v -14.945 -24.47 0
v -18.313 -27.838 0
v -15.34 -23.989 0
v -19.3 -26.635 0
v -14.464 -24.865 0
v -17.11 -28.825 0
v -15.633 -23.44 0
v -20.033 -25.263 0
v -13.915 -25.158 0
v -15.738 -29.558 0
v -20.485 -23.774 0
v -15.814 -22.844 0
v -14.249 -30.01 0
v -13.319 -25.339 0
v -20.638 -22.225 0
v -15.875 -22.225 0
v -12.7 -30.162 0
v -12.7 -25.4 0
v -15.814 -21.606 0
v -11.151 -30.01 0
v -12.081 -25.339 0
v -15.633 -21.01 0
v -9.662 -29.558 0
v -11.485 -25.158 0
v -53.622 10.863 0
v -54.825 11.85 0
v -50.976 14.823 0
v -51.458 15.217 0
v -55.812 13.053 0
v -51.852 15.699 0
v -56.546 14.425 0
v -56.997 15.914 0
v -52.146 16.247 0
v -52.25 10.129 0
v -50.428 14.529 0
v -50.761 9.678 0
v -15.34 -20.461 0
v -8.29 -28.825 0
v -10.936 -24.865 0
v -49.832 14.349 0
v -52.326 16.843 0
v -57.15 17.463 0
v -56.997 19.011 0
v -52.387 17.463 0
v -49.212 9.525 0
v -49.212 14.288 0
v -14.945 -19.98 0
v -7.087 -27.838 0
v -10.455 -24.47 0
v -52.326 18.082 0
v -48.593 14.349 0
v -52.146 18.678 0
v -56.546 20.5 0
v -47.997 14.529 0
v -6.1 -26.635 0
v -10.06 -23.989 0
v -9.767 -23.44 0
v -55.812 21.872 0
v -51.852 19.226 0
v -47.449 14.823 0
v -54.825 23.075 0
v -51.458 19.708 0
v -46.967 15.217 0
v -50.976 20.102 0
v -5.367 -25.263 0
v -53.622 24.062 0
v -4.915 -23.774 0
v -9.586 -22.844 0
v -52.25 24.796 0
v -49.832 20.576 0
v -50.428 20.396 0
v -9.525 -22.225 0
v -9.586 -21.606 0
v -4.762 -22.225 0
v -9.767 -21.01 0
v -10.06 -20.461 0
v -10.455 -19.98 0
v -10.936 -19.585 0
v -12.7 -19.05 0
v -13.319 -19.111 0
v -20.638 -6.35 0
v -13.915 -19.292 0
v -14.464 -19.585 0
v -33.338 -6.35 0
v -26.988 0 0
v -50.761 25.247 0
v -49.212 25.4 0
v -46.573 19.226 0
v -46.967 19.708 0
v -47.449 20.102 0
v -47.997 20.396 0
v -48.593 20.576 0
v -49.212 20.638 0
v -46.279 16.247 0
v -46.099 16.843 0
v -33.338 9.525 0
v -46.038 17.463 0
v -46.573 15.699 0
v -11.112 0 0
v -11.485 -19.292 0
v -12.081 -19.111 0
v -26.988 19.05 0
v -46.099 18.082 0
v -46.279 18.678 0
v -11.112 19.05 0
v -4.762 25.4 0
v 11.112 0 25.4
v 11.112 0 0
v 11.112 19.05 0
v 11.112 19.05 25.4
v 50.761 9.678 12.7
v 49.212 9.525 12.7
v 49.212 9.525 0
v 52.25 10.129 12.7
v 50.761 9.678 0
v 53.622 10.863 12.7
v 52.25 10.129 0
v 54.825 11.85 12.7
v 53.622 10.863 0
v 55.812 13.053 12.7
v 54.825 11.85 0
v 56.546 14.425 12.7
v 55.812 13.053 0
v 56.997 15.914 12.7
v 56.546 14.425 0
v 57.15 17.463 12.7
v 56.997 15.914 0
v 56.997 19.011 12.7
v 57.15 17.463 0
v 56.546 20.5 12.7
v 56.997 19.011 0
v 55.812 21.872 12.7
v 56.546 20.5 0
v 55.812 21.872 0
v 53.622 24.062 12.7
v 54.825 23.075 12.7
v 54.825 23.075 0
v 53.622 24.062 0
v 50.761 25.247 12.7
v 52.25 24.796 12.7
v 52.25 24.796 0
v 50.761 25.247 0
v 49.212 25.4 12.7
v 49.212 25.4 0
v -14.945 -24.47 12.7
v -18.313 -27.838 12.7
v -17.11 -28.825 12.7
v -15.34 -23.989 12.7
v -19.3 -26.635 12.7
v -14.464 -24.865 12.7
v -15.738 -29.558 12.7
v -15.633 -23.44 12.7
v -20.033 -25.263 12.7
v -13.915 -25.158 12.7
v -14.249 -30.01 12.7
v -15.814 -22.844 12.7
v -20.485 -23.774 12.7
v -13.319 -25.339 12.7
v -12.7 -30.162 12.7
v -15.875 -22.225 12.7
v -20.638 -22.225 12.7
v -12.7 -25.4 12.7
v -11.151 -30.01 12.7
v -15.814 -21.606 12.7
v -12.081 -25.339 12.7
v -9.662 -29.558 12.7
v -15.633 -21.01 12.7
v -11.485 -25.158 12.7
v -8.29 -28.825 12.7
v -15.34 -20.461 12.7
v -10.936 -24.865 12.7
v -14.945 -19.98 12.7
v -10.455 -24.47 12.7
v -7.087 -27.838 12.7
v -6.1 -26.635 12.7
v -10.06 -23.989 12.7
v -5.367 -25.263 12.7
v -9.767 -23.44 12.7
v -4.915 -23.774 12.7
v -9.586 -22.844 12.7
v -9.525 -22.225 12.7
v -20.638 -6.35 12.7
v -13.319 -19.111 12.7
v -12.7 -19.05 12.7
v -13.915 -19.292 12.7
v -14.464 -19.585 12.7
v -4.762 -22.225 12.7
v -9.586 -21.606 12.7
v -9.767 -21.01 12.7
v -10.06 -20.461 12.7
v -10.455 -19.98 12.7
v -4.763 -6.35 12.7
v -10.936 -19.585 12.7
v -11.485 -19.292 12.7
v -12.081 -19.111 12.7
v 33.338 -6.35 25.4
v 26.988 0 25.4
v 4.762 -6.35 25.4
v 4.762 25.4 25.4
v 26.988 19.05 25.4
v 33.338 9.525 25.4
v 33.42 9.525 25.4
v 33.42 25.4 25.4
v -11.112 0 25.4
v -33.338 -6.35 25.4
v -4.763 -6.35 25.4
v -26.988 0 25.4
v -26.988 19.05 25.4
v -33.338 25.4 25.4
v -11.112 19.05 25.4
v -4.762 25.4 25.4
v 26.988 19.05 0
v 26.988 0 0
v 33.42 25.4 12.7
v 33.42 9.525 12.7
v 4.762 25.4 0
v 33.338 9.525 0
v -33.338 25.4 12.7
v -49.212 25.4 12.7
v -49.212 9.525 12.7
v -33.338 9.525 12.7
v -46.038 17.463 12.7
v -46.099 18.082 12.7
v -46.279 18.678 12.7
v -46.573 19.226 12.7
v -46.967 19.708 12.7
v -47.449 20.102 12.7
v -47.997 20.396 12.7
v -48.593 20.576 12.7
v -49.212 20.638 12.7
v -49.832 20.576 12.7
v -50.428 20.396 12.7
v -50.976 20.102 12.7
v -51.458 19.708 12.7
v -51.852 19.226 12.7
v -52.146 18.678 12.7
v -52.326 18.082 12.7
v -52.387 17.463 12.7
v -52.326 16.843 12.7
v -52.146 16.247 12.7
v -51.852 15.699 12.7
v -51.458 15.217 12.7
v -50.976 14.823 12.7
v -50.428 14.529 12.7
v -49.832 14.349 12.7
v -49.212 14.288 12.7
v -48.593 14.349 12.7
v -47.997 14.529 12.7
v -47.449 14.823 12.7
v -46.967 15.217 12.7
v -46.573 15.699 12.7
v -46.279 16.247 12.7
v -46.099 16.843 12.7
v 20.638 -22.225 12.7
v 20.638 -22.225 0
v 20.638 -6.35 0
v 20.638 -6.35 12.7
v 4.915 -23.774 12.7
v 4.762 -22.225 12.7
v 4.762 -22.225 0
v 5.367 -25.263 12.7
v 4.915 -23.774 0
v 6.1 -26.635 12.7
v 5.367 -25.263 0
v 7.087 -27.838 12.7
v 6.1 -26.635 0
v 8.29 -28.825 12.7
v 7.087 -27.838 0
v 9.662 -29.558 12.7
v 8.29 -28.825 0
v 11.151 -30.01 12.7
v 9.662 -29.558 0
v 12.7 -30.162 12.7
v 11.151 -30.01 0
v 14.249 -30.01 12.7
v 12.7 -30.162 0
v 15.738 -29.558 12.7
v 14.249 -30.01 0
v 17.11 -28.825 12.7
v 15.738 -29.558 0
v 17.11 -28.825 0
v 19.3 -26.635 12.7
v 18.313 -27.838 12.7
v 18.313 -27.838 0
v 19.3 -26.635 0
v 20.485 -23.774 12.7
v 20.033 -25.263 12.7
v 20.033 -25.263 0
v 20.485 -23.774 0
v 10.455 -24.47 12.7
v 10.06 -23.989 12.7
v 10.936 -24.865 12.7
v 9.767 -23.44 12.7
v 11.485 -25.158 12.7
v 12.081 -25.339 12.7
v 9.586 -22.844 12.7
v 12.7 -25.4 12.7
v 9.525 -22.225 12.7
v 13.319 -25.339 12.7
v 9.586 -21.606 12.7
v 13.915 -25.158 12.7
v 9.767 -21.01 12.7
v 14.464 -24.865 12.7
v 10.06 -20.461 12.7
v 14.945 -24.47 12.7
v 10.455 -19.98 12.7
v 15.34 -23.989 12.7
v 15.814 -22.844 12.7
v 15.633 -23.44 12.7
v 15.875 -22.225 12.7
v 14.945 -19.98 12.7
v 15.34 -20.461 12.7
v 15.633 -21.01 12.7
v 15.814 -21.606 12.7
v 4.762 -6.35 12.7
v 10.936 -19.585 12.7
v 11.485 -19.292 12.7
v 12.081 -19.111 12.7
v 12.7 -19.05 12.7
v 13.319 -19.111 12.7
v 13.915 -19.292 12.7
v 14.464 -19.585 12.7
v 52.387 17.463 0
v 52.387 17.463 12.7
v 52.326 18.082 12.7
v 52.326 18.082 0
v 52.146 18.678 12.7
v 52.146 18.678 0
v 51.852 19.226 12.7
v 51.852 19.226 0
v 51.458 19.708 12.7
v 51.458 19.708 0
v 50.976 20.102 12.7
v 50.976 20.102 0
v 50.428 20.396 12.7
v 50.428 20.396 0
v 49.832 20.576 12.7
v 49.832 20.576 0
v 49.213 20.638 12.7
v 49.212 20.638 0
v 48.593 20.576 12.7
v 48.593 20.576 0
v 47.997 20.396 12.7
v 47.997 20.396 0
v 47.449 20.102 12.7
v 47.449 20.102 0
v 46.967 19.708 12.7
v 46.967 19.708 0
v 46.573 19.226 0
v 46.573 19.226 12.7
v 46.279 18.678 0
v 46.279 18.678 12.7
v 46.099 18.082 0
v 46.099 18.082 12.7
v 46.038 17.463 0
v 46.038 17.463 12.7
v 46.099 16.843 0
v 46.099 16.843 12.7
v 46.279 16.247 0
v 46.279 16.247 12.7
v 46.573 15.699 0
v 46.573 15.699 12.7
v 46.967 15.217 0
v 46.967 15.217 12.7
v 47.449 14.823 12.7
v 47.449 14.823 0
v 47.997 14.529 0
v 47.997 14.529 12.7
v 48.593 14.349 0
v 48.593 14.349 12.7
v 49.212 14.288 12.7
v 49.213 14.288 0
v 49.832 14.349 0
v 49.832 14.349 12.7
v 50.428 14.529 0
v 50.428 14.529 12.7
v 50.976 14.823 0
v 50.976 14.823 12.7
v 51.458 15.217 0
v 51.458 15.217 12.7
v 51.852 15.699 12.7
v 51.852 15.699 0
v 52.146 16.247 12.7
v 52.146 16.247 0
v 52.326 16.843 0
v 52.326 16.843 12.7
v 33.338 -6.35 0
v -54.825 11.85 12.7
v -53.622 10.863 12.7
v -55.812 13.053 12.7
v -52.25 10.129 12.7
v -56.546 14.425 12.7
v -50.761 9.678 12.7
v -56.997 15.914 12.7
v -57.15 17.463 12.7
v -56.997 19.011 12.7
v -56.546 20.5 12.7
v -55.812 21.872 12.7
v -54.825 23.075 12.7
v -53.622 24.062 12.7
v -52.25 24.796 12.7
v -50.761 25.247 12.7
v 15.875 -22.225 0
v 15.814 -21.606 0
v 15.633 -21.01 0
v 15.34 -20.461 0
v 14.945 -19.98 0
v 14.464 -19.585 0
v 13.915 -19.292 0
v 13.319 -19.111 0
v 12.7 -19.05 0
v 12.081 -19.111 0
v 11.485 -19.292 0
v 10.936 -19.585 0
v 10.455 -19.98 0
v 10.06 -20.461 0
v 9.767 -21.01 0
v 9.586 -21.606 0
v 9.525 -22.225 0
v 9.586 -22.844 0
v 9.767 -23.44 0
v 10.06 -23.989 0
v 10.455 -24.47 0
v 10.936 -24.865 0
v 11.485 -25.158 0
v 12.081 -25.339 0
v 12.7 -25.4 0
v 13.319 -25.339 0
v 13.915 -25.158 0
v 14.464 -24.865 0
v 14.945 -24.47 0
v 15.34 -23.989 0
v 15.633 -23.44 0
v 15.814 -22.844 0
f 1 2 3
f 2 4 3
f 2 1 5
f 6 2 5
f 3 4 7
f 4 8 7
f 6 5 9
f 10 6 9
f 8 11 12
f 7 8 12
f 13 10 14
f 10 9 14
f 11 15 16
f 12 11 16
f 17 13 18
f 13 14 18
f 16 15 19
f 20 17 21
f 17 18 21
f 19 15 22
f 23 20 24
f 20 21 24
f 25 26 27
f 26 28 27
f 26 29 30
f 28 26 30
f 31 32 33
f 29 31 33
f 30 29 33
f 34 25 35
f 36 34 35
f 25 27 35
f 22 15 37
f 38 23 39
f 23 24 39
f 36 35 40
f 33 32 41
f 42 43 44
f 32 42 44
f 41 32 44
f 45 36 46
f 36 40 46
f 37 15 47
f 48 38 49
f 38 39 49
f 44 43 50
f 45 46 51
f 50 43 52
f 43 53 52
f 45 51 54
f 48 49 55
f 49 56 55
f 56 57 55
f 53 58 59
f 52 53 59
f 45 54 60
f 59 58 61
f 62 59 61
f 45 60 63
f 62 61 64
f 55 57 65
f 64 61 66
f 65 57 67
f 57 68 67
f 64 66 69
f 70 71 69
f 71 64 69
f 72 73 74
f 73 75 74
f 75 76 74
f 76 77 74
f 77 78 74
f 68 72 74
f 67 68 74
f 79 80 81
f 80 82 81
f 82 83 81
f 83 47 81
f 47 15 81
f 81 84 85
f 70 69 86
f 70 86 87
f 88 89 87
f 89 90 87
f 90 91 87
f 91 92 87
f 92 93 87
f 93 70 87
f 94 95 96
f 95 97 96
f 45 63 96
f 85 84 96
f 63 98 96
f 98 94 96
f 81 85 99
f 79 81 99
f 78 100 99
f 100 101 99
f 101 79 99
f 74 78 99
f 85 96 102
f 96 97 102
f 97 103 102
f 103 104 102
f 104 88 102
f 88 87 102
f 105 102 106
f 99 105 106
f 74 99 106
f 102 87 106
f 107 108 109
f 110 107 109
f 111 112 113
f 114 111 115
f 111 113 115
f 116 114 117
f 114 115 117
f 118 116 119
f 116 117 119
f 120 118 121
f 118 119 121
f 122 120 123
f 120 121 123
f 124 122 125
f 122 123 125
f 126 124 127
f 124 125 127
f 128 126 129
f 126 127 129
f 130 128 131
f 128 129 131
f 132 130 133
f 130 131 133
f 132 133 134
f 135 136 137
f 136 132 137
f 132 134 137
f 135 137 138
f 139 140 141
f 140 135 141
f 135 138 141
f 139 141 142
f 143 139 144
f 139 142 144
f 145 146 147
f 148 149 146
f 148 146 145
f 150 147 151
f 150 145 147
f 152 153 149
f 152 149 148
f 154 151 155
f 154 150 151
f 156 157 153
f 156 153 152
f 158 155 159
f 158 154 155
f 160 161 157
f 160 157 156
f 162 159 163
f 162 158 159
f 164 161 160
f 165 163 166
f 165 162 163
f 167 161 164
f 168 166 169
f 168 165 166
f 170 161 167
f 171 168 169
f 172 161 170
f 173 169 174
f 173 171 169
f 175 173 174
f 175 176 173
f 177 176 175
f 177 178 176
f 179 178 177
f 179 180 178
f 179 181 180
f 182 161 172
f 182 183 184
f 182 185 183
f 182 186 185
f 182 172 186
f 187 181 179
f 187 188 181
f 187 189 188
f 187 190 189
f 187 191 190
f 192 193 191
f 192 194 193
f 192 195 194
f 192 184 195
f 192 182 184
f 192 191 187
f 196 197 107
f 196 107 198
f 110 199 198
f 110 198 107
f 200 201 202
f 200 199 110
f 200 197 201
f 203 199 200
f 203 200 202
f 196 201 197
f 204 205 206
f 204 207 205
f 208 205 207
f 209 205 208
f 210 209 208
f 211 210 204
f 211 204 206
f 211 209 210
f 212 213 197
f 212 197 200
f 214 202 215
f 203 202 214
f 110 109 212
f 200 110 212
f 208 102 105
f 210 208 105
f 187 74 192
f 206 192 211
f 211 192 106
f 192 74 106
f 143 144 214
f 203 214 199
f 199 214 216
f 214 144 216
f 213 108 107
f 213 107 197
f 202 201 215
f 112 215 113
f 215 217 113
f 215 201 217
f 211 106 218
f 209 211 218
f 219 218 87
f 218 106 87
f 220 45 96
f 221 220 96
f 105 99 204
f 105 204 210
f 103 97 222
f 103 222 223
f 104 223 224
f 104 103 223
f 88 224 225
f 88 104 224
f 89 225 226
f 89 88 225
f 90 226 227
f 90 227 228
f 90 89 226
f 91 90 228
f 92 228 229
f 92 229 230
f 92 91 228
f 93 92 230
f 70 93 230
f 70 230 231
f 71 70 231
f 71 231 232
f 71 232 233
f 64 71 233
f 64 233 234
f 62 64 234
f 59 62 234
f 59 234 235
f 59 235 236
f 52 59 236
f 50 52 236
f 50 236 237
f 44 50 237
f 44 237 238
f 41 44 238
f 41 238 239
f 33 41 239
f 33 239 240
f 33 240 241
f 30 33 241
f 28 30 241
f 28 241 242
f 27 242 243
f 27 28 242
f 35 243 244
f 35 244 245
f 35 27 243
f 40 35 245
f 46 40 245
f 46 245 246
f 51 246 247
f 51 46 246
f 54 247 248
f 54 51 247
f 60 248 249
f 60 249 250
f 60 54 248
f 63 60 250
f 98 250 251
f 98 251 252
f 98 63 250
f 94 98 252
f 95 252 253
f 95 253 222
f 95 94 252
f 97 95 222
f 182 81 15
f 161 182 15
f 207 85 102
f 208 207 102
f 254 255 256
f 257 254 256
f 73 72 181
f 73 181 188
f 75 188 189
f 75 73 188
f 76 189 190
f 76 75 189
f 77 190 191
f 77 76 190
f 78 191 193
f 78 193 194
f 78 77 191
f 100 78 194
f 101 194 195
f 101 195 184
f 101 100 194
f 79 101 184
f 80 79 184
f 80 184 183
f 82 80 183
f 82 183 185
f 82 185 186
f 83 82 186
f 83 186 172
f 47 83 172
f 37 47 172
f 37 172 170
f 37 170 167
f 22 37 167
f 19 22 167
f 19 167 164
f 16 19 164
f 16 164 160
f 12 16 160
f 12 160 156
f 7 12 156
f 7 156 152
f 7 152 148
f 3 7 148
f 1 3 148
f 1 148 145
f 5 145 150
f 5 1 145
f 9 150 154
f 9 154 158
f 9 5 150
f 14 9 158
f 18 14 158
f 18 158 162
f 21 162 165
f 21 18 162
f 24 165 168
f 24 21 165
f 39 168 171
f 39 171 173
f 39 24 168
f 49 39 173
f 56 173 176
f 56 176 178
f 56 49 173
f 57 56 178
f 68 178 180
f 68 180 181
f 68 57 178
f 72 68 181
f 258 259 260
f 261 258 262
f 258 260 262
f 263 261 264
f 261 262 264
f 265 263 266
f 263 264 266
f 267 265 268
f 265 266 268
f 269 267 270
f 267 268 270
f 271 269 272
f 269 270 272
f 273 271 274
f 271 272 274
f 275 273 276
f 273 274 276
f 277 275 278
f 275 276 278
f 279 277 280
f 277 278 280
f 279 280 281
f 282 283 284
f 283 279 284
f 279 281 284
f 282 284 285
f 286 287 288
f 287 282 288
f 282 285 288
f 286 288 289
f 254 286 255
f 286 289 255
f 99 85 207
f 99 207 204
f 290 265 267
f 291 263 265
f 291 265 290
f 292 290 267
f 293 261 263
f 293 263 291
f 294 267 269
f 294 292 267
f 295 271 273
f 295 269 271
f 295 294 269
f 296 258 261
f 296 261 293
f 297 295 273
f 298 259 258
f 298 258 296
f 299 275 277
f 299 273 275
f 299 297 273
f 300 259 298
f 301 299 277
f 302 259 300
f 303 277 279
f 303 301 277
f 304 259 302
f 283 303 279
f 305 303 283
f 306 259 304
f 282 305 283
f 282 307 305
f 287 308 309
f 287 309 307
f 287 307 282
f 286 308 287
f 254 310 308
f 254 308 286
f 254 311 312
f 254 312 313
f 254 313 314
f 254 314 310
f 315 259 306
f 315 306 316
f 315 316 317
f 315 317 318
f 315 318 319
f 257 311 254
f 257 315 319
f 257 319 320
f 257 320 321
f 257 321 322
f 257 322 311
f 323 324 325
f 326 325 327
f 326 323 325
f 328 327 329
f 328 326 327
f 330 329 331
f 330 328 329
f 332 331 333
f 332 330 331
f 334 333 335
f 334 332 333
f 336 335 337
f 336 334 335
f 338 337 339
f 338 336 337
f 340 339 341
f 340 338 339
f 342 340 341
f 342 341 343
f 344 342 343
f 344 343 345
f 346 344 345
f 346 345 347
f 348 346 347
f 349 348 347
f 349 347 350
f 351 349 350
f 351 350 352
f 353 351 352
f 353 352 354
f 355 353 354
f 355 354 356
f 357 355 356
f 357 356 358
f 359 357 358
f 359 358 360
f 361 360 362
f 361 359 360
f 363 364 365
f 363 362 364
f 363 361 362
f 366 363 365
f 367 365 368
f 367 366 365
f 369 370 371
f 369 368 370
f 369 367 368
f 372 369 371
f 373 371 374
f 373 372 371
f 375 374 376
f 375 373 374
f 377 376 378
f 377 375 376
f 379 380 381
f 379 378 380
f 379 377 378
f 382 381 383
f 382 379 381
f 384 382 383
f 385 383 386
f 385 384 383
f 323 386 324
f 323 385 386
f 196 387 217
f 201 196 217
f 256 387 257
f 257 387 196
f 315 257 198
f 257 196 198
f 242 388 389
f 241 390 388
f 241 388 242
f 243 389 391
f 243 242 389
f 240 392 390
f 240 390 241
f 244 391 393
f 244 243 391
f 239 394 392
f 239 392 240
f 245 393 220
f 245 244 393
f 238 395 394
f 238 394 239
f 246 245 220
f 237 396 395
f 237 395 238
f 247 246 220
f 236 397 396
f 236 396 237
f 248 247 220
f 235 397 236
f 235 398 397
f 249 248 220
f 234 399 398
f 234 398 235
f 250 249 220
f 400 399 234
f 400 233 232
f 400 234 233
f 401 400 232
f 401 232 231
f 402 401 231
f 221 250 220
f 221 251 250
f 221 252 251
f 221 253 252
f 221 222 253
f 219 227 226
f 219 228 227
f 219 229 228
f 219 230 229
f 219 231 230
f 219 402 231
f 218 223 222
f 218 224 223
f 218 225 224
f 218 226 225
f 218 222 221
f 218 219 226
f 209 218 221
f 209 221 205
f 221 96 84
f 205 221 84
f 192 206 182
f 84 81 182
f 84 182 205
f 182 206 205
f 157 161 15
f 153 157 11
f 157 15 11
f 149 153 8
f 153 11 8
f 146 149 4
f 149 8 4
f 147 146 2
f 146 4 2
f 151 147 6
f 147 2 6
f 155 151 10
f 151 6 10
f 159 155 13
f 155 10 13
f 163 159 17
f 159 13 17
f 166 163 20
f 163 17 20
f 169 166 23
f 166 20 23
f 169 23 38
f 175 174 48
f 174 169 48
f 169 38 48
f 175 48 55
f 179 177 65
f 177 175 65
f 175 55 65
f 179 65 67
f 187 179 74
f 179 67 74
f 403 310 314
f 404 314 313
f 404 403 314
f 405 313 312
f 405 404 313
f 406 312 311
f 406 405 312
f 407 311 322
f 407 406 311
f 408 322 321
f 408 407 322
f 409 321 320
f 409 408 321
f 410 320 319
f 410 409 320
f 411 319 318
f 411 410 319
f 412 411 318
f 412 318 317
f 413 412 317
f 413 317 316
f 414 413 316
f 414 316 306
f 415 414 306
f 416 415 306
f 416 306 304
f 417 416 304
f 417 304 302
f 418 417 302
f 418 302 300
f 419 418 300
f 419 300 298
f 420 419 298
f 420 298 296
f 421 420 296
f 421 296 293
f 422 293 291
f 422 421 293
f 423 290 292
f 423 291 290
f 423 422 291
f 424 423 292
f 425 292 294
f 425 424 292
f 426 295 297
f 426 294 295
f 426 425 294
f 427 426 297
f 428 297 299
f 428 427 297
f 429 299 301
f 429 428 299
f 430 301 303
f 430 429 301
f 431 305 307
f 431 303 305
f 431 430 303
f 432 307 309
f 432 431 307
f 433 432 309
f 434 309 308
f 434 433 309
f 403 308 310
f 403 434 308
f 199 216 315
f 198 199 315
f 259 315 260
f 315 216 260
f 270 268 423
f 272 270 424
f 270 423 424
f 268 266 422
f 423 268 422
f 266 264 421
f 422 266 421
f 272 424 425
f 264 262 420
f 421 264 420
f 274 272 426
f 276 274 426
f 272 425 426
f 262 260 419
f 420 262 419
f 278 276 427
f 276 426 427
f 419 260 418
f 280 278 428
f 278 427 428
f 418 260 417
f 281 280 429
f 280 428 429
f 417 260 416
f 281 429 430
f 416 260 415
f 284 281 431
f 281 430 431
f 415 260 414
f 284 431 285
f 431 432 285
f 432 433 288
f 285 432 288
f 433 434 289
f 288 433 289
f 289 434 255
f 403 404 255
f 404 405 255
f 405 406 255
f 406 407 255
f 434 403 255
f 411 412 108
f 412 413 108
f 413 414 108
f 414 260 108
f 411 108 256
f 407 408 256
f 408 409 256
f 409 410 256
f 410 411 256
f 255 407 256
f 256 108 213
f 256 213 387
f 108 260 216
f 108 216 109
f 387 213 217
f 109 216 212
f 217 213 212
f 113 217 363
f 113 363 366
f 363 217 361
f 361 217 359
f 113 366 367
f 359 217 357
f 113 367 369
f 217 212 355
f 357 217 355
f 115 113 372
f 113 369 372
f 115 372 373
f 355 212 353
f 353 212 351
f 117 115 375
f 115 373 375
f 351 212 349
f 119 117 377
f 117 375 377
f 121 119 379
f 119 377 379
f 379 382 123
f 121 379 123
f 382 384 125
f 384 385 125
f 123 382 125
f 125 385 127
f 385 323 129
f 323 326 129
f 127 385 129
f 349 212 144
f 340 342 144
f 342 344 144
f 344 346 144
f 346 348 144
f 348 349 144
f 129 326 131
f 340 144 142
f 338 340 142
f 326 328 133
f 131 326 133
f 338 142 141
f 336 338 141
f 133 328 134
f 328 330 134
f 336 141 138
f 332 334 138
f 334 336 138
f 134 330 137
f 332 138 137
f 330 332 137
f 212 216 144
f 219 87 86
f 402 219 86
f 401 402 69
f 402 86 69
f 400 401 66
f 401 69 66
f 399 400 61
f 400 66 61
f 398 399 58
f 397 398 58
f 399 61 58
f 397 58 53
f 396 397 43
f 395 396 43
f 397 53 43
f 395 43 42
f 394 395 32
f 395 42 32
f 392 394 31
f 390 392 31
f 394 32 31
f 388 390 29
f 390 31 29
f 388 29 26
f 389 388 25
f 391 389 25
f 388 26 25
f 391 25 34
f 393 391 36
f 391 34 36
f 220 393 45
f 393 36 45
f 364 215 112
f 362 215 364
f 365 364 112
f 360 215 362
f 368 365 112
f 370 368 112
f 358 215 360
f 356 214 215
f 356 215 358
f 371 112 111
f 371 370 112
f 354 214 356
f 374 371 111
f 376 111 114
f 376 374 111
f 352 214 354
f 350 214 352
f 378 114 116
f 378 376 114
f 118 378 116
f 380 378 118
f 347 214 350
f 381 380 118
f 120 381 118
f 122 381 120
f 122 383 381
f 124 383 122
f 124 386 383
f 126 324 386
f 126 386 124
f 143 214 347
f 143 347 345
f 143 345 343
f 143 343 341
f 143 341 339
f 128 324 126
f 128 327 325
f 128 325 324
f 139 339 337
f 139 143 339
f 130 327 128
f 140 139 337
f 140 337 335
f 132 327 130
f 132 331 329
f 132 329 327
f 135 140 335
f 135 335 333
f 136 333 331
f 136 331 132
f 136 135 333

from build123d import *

# Parameters (mm, degrees)
F0_R     = 3.175
F0_W     = 15.875
F0_H     = 19.05
F1_DEPTH = 25.4
F2_R     = 3.175
F2_W     = 36.9337536395
F2_H     = 27.8778783977
F3_DEPTH = 12.7


with BuildPart() as f1:
    # F0 (on Top) → F1 (new body)
    with BuildSketch(Plane.XY):
        with BuildLine():
            Line((-4.7625, -22.2249999642), (-4.7625, -6.3499999642))
            Line((-4.7625, -6.3499999642), (-4.7625, 25.4000000358))
            Line((-4.7625, 25.4000000358), (-33.3375, 25.4000000358))
            Line((-33.3375, 25.4000000358), (-49.2125, 25.4000000358))
            ThreePointArc((-49.2125, 25.4000000358), (-57.15, 17.4625000358), (-49.2125, 9.5250000358))
            Line((-49.2125, 9.5250000358), (-33.3375, 9.5250000358))
            Line((-33.3375, 9.5250000358), (-33.3375, -6.3499999642))
            Line((-33.3375, -6.3499999642), (-20.6375, -6.3499999642))
            Line((-20.6375, -6.3499999642), (-20.6375, -22.2249999642))
            ThreePointArc((-20.6375, -22.2249999642), (-12.7, -30.1624999642), (-4.7625, -22.2249999642))
        make_face()
        with Locations((-12.7, -22.2249999642)):
            Circle(F0_R, mode=Mode.SUBTRACT)
        with Locations((-19.05, 9.5250000358)):
            Rectangle(F0_W, F0_H, mode=Mode.SUBTRACT)
        with Locations((-49.2125, 17.4625000358)):
            Circle(F0_R, mode=Mode.SUBTRACT)
    extrude(amount=F1_DEPTH)


with BuildPart() as f1b:
    # F0 (on Top) → F1, piece 2 (new body)
    with BuildSketch(Plane.XY):
        with BuildLine():
            Line((4.7625, 25.4000000358), (4.7625, -6.3499999642))
            Line((4.7625, -6.3499999642), (4.7625, -22.2249999642))
            ThreePointArc((4.7625, -22.2249999642), (12.7, -30.1624999642), (20.6375, -22.2249999642))
            Line((20.6375, -22.2249999642), (20.6375, -6.3499999642))
            Line((20.6375, -6.3499999642), (33.3375, -6.3499999642))
            Line((33.3375, -6.3499999642), (33.3375, 9.5250000358))
            Line((33.3375, 9.5250000358), (49.2125, 9.5250000358))
            ThreePointArc((49.2125, 9.5250000358), (57.15, 17.4625000358), (49.2125, 25.4000000358))
            Line((49.2125, 25.4000000358), (33.3375, 25.4000000358))
            Line((33.3375, 25.4000000358), (4.7625, 25.4000000358))
        make_face()
        with Locations((12.7, -22.2249999642)):
            Circle(F0_R, mode=Mode.SUBTRACT)
        with Locations((19.05, 9.5250000358)):
            Rectangle(F0_W, F0_H, mode=Mode.SUBTRACT)
        with Locations((49.2125, 17.4625000358)):
            Circle(F0_R, mode=Mode.SUBTRACT)
    extrude(amount=F1_DEPTH)


with BuildPart() as f3_tool:
    # F2 (on face) → F3 (new body)
    with BuildSketch(Plane.XY.offset(25.4)):
        with BuildLine():
            Line((-49.2125, 9.5250000358), (-33.3375, 9.5250000358))
            Line((-33.3375, 9.5250000358), (-33.3375, 25.4000000358))
            Line((-33.3375, 25.4000000358), (-49.2125, 25.4000000358))
            ThreePointArc((-49.2125, 25.4000000358), (-57.15, 17.4625000358), (-49.2125, 9.5250000358))
        make_face()
        with Locations((-49.2125, 17.4625000358)):
            Circle(F2_R, mode=Mode.SUBTRACT)
        with BuildLine():
            Line((-20.6375, -6.3499999642), (-20.6375, -22.2249999642))
            ThreePointArc((-20.6375, -22.2249999642), (-12.7, -30.1624999642), (-4.7625, -22.2249999642))
            Line((-4.7625, -22.2249999642), (-4.7625, -6.3499999642))
            Line((-4.7625, -6.3499999642), (-20.6375, -6.3499999642))
        make_face()
        with Locations((-12.7, -22.2249999642)):
            Circle(F2_R, mode=Mode.SUBTRACT)
        with BuildLine():
            Line((-20.6375, -22.2249999642), (-20.6375, -35.4340933263))
            Line((-20.6375, -35.4340933263), (0, -35.4340933263))
            Line((0, -35.4340933263), (34.3079790473, -35.6928557158))
            Line((34.3079790473, -35.6928557158), (34.3079790473, -6.3499999642))
            Line((34.3079790473, -6.3499999642), (-4.7625, -6.3499999642))
            Line((-4.7625, -6.3499999642), (-4.7625, -22.2249999642))
            ThreePointArc((-4.7625, -22.2249999642), (-12.7, -30.1624999642), (-20.6375, -22.2249999642))
        make_face()
        with Locations((51.8870260566, 22.8151772171)):
            Rectangle(F2_W, F2_H)
    extrude(amount=-F3_DEPTH)


with BuildPart() as f1_1:
    add(f1.part)

    # F3: cut by f3_tool
    add(f3_tool.part, mode=Mode.SUBTRACT)


with BuildPart() as f1b_1:
    add(f1b.part)

    # F3: cut by f3_tool
    add(f3_tool.part, mode=Mode.SUBTRACT)


solid = Compound([f1_1.part, f1b_1.part])
